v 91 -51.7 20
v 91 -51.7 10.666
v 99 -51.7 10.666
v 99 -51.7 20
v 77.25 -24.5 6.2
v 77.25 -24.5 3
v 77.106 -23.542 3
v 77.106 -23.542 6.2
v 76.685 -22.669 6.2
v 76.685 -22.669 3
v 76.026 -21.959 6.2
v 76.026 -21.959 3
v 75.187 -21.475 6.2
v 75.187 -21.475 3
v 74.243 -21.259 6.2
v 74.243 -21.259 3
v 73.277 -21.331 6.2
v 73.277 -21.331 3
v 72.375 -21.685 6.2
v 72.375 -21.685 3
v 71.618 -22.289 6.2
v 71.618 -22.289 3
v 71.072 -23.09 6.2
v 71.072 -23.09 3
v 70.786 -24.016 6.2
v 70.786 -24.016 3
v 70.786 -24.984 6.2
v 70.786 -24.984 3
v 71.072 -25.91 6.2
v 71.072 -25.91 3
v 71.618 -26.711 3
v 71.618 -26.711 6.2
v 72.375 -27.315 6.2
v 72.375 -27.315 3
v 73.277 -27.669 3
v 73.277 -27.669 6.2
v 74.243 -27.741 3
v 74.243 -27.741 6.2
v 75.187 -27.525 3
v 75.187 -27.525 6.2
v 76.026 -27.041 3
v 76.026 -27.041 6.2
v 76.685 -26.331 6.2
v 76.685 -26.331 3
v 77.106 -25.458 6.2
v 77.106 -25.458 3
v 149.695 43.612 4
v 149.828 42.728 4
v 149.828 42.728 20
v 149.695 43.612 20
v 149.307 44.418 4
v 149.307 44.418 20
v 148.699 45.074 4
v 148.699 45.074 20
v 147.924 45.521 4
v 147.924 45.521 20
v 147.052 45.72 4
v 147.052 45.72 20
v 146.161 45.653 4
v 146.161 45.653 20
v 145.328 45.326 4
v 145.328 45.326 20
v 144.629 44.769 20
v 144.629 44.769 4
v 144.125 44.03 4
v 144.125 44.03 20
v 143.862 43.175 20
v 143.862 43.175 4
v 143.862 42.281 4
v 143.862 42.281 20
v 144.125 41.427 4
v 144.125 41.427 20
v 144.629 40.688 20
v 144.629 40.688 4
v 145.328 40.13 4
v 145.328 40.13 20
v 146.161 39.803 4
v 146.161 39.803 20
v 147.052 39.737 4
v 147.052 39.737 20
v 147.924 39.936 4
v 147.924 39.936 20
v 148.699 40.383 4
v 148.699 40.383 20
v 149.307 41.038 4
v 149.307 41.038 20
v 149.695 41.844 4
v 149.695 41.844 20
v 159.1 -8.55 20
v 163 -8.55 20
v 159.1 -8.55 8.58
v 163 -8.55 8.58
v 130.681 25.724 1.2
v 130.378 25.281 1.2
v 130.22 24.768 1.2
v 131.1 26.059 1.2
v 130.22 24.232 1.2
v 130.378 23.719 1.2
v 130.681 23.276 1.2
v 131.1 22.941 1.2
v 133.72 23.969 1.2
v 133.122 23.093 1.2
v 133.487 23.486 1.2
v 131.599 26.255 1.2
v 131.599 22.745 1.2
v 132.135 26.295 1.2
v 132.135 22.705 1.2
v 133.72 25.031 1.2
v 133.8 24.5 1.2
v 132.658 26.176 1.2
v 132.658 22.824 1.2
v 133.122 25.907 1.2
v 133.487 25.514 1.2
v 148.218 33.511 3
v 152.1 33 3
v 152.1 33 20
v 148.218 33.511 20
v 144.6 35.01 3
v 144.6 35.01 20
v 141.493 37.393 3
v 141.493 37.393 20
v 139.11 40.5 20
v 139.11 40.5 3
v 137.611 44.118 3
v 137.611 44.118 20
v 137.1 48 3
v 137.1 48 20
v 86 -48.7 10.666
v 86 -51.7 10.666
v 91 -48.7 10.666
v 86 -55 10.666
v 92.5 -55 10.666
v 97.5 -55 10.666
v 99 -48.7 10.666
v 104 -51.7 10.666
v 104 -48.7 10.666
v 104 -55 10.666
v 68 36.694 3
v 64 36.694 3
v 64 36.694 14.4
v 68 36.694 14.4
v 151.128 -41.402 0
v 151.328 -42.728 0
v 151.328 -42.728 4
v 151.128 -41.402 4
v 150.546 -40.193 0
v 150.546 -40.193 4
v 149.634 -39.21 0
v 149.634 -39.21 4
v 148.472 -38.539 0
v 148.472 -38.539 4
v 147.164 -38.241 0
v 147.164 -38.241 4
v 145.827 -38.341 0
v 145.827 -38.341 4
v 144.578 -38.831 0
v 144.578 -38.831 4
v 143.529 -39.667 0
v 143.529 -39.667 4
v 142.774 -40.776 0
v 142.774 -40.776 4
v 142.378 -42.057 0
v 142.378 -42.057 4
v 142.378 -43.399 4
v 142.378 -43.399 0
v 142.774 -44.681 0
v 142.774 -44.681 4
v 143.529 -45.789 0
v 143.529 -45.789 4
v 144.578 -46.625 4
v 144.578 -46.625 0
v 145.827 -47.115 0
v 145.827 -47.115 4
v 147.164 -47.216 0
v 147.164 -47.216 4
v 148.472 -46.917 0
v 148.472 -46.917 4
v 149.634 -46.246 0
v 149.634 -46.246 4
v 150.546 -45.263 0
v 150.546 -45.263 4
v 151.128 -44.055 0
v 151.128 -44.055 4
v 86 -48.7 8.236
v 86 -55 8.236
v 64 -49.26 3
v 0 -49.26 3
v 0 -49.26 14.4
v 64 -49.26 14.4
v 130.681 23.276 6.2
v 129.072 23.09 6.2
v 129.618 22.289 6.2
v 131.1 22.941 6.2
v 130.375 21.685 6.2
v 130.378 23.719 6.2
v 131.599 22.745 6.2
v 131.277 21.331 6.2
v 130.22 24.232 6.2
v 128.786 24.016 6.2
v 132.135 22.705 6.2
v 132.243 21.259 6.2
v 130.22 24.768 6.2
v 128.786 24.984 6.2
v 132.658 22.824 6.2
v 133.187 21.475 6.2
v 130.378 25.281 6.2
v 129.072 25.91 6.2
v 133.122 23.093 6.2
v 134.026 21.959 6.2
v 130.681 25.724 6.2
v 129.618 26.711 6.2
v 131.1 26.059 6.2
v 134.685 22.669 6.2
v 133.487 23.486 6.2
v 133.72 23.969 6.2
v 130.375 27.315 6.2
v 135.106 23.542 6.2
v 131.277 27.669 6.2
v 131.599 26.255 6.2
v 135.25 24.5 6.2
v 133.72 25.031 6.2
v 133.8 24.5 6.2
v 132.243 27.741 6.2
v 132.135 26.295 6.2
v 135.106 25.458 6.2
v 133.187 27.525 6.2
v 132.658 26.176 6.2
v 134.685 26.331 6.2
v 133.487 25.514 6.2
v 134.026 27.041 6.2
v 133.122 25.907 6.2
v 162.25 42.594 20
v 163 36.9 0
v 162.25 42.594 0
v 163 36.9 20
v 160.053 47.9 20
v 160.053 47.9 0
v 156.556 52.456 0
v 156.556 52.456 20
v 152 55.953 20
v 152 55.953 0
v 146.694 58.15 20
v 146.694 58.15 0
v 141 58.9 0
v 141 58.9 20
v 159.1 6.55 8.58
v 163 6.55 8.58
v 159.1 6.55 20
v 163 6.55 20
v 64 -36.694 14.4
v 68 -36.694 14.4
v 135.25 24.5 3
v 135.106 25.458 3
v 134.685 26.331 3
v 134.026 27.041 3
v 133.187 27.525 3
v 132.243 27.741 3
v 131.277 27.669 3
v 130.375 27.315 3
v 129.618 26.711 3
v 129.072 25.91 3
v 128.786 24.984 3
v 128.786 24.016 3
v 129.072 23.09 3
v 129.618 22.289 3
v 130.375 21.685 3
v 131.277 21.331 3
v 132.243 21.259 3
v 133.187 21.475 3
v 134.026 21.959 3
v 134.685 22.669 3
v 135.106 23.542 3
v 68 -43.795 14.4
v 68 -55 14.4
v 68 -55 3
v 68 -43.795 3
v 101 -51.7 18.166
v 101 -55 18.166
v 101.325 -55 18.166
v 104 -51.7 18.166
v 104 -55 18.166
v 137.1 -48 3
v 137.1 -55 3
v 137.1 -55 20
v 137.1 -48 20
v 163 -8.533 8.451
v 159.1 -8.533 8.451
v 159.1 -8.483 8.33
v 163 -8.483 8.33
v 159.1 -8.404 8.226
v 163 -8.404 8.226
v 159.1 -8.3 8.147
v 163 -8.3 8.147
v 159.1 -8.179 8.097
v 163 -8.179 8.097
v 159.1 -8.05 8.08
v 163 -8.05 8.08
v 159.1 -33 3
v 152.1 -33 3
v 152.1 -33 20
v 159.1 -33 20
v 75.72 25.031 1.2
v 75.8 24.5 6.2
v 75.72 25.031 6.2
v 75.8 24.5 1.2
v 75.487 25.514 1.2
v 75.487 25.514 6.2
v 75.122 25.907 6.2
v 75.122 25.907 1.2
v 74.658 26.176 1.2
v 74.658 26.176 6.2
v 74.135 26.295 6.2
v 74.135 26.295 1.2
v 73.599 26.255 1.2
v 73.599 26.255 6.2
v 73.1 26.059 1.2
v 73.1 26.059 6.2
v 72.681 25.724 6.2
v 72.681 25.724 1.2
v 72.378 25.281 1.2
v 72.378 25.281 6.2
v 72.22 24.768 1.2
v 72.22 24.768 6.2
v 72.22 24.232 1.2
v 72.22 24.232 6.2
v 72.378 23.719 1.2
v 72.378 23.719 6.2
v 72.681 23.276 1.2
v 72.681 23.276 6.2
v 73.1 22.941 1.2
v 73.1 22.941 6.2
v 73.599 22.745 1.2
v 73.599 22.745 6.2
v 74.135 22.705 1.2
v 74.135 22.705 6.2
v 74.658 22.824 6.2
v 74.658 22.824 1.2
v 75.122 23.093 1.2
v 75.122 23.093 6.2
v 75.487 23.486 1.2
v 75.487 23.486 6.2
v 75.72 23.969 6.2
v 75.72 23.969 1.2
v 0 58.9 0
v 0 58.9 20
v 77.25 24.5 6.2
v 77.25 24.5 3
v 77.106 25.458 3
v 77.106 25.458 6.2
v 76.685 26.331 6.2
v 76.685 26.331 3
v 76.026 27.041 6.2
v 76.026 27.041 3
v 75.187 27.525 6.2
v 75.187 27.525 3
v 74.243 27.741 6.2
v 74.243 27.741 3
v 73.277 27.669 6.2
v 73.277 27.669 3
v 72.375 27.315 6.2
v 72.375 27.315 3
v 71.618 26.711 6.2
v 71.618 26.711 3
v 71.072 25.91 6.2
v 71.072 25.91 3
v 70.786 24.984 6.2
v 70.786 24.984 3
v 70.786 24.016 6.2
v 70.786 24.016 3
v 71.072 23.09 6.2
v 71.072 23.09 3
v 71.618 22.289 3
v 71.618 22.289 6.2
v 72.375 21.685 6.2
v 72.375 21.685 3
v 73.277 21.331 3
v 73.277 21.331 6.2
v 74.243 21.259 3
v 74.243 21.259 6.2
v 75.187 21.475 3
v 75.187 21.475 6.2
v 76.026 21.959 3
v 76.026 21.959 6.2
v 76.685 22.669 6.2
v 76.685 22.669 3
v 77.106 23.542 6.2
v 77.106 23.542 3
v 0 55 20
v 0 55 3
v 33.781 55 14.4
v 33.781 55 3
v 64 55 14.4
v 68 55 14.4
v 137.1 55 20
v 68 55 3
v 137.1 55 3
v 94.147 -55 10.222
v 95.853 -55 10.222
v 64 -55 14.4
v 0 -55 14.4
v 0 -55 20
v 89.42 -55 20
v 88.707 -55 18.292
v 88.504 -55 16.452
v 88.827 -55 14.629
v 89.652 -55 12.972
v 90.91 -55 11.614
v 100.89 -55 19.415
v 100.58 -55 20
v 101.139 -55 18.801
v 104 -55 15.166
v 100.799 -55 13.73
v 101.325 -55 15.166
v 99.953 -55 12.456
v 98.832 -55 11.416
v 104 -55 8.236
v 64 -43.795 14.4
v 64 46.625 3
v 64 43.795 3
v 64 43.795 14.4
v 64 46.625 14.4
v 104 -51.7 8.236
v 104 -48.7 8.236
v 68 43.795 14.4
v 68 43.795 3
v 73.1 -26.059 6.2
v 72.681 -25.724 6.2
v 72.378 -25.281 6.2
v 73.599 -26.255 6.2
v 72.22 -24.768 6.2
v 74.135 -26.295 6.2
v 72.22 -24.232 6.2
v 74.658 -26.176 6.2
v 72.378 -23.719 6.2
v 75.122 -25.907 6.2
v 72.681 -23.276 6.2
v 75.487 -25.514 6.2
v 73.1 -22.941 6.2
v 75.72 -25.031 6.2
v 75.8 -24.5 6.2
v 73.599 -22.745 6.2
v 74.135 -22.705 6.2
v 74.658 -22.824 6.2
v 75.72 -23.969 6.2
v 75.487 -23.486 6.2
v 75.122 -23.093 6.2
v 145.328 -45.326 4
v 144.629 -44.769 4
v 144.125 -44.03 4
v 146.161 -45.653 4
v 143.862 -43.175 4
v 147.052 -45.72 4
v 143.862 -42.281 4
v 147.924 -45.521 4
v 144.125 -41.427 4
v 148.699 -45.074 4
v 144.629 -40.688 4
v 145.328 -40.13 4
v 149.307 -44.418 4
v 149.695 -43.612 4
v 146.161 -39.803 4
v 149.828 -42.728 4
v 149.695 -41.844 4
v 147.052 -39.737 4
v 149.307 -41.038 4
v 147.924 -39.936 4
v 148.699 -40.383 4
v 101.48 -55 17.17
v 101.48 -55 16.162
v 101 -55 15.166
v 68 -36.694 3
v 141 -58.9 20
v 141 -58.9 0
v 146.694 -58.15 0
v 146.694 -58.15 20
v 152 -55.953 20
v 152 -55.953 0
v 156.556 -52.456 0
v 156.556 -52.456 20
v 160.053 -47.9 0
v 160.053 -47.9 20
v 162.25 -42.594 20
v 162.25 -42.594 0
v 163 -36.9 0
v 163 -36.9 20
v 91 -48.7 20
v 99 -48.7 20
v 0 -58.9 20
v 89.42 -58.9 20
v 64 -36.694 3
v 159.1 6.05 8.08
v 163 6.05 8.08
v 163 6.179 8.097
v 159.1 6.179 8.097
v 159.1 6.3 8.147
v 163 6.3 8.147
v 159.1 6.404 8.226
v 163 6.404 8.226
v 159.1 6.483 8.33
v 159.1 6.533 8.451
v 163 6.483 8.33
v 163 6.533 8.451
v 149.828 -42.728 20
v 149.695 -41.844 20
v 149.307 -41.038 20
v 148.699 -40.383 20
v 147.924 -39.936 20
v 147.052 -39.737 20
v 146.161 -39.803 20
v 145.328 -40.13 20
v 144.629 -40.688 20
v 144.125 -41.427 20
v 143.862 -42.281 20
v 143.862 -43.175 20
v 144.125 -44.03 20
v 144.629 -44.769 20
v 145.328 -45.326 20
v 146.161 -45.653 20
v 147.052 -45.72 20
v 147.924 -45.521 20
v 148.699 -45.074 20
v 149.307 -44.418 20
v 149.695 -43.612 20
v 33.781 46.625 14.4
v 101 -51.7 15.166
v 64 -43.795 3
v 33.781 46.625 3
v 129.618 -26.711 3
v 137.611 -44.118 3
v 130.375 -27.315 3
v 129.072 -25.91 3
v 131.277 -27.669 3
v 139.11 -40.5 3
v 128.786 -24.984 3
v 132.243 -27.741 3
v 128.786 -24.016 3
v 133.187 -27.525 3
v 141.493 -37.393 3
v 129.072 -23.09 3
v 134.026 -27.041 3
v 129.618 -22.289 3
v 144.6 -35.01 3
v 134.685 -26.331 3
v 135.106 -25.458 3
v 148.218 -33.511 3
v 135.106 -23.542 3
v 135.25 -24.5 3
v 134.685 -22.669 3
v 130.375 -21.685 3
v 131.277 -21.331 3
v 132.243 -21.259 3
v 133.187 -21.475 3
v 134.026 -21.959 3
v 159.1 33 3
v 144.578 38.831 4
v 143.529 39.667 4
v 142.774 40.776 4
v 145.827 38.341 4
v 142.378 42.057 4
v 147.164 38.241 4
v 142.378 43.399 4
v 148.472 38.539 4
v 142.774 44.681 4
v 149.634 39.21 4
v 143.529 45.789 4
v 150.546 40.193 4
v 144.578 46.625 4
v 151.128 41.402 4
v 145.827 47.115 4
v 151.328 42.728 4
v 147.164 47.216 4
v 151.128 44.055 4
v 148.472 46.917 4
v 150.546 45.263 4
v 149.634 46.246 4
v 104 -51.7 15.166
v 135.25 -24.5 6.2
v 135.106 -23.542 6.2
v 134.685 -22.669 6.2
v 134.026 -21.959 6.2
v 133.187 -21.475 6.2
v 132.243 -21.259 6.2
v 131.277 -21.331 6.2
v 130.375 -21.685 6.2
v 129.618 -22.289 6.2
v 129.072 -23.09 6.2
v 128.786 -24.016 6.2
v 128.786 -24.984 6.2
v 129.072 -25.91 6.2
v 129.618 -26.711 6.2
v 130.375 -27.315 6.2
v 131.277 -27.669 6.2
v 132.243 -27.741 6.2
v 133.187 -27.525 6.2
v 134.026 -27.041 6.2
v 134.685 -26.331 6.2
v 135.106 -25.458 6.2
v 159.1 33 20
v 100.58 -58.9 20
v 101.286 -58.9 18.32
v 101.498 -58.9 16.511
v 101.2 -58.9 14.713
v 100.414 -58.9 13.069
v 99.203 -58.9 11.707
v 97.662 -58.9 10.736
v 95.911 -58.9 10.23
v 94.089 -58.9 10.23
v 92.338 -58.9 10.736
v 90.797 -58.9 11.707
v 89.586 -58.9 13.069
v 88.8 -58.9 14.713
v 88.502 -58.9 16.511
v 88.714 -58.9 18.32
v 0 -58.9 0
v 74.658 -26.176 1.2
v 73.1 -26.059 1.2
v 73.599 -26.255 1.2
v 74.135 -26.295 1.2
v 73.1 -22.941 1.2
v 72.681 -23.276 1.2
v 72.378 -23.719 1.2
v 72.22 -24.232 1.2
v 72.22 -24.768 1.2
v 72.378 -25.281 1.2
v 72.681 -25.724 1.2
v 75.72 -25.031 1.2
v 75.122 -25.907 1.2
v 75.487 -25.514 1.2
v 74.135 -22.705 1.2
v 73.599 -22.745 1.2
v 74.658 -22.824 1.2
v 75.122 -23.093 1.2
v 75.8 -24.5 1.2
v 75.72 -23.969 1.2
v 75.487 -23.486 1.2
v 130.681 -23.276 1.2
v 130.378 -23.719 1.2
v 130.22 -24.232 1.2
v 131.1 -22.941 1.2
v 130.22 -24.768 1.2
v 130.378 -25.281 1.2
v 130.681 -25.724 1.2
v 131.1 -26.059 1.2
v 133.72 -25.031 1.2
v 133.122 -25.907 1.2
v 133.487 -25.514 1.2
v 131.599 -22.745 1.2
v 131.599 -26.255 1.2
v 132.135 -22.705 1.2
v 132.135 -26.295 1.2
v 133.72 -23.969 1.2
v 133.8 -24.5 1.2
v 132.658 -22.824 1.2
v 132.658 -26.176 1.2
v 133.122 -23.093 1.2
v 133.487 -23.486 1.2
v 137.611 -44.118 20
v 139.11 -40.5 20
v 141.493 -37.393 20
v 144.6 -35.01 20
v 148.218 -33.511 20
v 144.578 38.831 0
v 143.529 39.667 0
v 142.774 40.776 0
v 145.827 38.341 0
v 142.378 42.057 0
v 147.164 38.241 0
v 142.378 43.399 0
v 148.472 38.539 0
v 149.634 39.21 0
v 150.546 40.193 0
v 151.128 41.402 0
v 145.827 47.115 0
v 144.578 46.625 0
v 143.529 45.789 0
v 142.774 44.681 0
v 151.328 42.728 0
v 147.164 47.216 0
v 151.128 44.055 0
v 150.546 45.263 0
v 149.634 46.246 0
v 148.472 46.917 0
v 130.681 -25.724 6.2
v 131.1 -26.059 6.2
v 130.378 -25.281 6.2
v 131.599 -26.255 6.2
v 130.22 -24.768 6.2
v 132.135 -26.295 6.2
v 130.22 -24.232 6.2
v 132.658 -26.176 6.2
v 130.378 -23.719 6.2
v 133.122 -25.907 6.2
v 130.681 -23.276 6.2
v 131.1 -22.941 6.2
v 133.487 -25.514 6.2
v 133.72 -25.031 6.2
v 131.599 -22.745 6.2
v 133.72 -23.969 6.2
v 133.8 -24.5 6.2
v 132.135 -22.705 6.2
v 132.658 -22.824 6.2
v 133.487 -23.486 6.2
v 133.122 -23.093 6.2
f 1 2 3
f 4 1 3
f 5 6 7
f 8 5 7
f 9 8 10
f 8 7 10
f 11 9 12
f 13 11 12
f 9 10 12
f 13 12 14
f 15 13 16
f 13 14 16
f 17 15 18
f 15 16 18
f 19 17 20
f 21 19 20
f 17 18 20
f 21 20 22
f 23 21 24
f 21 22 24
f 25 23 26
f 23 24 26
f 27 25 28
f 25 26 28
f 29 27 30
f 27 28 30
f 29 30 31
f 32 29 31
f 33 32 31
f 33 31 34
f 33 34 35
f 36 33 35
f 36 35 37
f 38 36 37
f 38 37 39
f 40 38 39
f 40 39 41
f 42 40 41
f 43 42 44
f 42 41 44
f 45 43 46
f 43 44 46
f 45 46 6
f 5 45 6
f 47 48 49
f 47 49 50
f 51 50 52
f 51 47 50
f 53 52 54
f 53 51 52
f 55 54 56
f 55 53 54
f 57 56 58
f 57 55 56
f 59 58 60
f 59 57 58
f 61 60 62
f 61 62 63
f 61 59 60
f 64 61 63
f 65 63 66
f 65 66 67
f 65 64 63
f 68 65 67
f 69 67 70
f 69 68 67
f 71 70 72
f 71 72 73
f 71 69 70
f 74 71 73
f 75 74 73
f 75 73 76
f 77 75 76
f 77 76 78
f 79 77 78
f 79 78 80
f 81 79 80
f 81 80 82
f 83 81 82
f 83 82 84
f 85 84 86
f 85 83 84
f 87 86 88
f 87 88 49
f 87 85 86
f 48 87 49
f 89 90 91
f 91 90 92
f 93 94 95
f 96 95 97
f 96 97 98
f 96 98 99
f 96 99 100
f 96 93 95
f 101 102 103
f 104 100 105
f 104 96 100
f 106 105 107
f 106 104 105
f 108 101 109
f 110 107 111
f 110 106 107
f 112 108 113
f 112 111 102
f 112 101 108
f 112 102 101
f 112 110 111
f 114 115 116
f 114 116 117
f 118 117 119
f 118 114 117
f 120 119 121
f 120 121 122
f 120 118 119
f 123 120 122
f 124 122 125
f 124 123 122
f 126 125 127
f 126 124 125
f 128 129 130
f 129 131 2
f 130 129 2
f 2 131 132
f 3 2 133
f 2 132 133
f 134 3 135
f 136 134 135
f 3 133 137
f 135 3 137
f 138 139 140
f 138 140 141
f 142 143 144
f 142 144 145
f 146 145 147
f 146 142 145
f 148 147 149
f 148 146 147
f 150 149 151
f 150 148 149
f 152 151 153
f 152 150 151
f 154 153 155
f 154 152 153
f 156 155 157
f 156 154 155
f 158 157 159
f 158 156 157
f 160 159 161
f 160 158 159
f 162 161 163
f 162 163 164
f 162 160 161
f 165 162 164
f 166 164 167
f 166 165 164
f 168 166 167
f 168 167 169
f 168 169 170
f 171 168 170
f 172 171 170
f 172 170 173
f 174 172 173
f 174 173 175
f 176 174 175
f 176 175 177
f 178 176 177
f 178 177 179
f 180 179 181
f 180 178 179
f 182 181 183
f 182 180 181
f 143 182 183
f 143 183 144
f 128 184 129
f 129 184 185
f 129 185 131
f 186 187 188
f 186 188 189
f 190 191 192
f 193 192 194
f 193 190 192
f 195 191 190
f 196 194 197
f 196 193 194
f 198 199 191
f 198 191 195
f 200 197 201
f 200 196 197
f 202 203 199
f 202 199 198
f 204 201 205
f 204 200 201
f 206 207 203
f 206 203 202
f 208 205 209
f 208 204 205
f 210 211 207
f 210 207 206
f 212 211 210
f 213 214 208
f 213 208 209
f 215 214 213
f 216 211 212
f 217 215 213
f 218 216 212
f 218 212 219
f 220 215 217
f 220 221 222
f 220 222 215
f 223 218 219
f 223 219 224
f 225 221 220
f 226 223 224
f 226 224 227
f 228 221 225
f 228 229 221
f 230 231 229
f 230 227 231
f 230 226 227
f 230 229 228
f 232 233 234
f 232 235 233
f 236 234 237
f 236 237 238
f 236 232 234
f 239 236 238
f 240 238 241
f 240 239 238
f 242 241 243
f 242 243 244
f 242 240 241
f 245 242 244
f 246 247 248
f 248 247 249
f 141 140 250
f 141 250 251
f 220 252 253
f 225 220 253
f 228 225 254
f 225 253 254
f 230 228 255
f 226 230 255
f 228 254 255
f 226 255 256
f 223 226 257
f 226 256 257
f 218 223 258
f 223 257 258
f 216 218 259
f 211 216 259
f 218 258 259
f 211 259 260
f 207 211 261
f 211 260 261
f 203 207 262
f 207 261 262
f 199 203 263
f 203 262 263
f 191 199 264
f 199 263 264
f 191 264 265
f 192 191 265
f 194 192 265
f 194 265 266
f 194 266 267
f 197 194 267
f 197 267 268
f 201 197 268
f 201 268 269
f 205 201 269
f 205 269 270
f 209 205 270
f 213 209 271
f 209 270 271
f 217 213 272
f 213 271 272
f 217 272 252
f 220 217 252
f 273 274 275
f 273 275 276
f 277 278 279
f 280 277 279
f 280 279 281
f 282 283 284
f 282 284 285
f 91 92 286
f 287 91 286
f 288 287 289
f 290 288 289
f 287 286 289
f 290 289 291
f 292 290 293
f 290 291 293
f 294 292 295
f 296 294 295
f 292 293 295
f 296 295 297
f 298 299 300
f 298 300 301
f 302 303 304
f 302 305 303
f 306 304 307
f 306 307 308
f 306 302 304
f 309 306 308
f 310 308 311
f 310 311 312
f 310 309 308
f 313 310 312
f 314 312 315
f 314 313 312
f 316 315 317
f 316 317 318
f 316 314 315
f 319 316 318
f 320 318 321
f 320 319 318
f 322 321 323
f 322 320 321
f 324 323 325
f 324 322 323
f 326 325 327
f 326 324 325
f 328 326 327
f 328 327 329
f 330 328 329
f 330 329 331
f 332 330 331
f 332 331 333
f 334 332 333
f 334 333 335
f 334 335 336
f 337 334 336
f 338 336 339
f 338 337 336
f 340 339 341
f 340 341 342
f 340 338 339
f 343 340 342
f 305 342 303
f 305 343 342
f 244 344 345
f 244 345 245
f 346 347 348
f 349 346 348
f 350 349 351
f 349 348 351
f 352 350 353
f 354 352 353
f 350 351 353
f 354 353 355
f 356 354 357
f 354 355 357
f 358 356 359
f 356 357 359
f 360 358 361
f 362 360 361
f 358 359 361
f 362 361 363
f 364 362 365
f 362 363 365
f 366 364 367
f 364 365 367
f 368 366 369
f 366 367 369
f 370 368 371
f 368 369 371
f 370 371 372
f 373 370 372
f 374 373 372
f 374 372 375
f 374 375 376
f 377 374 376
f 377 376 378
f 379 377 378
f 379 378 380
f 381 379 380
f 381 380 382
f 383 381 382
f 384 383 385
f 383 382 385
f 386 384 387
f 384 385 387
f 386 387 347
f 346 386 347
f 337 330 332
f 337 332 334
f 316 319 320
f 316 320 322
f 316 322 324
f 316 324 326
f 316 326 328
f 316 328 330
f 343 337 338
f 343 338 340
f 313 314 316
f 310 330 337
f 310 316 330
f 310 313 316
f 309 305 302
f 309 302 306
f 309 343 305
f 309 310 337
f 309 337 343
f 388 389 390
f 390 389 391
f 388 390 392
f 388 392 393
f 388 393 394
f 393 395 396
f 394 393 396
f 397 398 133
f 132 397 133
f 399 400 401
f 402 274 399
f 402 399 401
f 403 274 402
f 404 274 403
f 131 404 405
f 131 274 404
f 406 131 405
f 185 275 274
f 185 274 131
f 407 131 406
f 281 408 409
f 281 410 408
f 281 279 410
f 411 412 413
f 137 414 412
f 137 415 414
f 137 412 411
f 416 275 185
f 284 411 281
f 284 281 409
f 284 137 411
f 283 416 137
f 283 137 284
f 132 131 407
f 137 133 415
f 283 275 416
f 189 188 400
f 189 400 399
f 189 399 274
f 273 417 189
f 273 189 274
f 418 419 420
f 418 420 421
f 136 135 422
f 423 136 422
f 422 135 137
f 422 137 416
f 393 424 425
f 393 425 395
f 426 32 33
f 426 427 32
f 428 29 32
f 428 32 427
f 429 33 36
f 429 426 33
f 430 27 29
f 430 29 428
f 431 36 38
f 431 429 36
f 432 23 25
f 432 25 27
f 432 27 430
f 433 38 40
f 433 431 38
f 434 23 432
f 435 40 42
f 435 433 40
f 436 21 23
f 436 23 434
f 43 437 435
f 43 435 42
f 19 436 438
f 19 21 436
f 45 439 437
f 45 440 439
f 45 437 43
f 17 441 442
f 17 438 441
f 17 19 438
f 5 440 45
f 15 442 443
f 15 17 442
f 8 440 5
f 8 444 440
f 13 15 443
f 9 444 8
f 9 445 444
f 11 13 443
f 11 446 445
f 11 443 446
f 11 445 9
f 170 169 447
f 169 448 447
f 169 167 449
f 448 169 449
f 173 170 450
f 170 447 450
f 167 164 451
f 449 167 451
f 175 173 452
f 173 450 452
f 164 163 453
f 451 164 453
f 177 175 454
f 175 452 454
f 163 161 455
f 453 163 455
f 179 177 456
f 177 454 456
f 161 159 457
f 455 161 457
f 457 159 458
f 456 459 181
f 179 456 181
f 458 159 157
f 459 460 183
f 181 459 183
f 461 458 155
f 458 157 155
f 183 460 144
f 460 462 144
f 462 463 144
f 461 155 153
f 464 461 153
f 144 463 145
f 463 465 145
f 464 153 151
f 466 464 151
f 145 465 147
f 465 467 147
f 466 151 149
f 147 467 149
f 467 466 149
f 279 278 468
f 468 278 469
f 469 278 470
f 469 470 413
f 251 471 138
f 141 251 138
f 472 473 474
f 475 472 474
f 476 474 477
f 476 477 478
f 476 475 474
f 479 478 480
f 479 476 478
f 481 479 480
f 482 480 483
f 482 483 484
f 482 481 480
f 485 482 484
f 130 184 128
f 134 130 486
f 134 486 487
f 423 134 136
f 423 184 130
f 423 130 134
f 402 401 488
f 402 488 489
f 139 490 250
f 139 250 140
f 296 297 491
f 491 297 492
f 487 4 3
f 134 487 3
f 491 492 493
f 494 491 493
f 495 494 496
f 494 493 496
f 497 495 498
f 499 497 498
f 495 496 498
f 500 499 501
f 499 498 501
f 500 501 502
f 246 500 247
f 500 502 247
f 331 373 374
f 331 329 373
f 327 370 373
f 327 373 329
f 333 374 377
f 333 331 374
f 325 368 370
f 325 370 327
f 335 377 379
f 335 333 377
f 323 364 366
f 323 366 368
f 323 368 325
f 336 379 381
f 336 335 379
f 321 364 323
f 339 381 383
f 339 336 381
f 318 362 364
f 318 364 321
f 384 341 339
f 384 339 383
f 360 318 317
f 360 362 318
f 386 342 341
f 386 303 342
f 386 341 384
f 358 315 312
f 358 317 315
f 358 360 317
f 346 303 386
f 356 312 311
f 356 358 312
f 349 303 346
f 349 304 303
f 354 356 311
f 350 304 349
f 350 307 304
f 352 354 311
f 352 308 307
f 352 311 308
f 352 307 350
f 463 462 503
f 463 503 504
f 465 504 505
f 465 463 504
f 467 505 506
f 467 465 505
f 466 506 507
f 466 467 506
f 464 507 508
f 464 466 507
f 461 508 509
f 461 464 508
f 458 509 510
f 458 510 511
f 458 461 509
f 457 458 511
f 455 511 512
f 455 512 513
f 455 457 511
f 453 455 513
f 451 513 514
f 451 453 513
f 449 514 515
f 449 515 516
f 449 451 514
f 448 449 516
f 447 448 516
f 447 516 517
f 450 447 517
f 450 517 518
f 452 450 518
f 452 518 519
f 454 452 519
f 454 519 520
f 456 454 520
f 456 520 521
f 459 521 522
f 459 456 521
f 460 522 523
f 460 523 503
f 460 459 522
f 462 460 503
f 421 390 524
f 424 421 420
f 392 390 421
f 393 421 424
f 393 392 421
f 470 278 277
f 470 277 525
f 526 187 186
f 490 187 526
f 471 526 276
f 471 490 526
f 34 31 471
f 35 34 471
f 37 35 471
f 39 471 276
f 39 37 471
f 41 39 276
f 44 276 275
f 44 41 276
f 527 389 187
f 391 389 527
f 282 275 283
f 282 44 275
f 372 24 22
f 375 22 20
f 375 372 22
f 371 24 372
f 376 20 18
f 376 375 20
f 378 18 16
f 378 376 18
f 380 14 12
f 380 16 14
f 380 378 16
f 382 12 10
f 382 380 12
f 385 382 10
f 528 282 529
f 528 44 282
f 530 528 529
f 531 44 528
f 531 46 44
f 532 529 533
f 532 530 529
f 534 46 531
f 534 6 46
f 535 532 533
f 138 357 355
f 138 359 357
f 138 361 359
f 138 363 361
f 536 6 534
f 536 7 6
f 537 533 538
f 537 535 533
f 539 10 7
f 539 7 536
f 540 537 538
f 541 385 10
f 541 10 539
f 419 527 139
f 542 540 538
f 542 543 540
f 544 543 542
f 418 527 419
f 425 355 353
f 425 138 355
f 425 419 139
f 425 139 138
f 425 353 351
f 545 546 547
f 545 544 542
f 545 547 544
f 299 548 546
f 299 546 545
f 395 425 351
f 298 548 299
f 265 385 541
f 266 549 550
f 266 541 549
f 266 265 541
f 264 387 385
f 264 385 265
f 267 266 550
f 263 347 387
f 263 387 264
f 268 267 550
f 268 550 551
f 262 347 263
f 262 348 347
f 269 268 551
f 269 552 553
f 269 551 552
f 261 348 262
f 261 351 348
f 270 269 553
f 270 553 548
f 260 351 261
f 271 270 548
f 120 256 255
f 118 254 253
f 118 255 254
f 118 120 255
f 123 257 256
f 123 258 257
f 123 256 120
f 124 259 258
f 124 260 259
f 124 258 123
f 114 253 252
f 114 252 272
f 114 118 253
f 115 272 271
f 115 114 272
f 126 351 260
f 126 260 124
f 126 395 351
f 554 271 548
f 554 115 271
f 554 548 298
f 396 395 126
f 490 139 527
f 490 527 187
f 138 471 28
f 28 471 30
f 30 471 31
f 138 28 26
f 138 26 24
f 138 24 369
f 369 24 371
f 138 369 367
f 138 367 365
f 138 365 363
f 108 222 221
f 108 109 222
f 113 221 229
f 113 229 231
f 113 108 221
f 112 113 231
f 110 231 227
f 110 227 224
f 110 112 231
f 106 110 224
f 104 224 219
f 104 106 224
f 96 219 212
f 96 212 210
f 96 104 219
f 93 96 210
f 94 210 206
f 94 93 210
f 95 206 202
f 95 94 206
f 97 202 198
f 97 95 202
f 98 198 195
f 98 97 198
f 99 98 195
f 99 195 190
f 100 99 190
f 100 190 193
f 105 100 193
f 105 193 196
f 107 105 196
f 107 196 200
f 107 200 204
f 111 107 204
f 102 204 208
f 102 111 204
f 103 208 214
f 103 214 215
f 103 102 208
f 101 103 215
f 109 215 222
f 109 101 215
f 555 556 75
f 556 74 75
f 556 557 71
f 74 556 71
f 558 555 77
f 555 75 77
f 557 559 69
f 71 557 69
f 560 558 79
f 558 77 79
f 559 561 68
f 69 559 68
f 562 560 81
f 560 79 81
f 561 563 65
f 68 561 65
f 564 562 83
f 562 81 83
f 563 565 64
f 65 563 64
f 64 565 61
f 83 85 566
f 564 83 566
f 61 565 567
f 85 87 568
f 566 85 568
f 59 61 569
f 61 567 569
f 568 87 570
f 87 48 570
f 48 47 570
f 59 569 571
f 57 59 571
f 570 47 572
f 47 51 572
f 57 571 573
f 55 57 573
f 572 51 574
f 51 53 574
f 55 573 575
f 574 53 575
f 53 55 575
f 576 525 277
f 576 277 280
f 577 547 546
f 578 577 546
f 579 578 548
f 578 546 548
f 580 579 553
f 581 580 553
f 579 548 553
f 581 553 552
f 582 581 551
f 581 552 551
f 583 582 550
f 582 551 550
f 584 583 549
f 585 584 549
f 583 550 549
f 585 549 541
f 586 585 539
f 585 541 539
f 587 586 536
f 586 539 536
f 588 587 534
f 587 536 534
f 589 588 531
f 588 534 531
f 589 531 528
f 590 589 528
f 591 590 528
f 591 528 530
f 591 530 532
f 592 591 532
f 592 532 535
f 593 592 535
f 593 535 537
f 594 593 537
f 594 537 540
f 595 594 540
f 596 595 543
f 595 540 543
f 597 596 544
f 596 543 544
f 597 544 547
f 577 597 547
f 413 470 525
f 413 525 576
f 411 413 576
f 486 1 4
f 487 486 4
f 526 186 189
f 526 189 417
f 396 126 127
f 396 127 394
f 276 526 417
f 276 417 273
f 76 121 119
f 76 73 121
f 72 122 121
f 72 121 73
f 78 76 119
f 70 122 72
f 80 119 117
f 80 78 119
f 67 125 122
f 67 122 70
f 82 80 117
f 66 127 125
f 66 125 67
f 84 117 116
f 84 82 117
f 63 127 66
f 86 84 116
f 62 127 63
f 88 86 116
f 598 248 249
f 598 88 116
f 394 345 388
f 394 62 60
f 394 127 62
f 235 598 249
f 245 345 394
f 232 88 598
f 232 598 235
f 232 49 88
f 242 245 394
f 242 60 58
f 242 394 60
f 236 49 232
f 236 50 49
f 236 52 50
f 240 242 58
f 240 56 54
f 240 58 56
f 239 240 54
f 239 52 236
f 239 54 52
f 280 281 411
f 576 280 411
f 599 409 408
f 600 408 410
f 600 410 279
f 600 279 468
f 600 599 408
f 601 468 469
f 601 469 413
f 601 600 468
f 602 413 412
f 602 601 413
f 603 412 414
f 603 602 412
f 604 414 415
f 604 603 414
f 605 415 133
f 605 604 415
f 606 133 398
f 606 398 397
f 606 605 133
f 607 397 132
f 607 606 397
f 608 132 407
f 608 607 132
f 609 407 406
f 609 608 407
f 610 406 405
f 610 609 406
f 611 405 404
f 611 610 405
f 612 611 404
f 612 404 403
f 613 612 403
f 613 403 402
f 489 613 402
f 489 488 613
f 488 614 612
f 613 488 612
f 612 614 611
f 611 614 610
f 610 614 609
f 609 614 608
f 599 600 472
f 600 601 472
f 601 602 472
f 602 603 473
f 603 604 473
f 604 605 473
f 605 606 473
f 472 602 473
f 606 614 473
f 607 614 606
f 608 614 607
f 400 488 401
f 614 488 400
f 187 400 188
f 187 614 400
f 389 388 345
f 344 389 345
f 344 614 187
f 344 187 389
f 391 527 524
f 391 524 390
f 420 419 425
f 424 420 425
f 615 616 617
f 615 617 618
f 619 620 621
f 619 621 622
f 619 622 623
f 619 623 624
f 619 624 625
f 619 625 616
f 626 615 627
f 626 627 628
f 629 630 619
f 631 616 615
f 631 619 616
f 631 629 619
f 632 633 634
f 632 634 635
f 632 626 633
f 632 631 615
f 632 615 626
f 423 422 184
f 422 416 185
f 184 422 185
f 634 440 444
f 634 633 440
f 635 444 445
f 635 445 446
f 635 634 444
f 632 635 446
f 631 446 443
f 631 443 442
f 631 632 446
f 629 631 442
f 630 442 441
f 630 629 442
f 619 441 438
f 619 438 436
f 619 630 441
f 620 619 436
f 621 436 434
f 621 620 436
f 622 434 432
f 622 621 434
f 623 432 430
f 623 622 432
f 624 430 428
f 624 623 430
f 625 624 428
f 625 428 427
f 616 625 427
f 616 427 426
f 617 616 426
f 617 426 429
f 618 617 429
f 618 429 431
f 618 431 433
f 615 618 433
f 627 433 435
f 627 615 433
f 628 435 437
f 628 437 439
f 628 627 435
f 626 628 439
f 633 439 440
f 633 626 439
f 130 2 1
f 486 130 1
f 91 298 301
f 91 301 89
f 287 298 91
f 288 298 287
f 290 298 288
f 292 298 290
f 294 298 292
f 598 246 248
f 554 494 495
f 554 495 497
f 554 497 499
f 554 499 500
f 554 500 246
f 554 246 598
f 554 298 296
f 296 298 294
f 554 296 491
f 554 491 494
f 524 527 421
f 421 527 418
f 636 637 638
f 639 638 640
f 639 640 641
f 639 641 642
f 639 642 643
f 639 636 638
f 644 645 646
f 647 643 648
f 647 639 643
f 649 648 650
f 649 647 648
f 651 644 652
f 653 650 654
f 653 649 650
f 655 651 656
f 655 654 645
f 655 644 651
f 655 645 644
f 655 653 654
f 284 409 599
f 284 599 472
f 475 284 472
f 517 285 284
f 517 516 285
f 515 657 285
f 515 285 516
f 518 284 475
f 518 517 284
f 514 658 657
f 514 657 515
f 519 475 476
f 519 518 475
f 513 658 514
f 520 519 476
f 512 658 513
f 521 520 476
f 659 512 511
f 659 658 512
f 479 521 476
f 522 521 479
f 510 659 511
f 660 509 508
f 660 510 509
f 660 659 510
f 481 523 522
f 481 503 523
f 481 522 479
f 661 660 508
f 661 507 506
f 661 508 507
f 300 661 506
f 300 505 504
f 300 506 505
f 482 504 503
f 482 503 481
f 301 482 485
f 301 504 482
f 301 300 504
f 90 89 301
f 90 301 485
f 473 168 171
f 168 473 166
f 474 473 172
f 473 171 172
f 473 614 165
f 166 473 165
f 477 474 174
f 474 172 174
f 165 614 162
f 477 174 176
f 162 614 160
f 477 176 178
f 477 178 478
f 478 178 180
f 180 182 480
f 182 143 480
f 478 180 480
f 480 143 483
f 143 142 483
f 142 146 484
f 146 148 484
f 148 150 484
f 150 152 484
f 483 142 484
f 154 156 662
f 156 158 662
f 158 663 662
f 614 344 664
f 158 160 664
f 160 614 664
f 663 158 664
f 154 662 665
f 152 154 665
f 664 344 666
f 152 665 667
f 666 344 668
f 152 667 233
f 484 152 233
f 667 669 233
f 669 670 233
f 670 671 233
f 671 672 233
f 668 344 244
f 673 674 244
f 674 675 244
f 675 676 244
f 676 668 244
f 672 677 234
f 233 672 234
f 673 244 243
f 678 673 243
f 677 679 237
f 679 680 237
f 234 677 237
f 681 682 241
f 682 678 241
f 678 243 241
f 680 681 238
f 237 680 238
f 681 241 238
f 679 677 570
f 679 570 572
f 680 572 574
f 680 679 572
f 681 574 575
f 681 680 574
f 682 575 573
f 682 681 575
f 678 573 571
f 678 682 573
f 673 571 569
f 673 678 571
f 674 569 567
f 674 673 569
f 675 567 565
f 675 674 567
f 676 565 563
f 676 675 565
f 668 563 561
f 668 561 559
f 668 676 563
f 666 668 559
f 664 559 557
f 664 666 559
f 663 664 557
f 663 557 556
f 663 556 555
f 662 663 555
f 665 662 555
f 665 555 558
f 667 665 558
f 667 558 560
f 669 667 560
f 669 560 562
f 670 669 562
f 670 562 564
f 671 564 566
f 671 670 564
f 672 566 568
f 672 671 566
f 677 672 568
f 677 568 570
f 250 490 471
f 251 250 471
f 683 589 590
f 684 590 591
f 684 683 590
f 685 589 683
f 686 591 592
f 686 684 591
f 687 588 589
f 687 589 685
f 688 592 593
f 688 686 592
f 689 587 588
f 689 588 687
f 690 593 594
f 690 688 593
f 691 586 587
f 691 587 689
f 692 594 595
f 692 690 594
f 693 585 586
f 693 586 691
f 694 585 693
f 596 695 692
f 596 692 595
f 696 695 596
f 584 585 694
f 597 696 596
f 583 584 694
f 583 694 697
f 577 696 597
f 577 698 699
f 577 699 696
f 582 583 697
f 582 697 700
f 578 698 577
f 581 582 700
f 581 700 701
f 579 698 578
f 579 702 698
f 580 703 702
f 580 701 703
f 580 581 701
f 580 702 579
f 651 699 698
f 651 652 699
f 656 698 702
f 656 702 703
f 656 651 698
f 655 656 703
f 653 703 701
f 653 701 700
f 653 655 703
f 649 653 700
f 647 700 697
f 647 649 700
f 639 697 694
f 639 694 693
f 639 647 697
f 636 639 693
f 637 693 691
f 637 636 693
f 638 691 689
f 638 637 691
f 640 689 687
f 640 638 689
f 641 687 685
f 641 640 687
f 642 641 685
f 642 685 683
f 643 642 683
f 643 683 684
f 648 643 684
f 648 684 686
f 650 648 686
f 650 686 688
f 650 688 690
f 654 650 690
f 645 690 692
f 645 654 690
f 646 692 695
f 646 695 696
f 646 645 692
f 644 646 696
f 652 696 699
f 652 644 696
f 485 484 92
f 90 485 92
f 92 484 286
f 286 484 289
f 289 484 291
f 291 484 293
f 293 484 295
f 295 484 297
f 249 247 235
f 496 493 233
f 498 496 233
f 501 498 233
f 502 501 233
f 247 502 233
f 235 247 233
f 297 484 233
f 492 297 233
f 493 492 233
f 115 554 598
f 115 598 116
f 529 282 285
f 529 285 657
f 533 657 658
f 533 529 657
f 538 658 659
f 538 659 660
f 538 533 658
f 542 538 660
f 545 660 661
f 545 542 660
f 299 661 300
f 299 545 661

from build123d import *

# Parameters (mm, degrees)
SKETCH1_W               = 326
SKETCH1_H               = 117.8
SKETCH1_W_2             = 318.2
SKETCH1_H_2             = 110
BOSS_EXTRUDE1_DEPTH     = 20
SKETCH1_3_W             = 318.2
SKETCH1_3_H             = 110
BOSS_EXTRUDE2_DEPTH     = 3
BOSS_EXTRUDE6_START     = 3
SKETCH6_R               = 3.25
SKETCH6_R_2             = 1.8
BOSS_EXTRUDE6_DEPTH     = 3.2
FILLET1_R               = 22
CUT_EXTRUDE3_START      = 163
CUT_EXTRUDE3_DEPTH      = 3.9
CUT_EXTRUDE4_START      = 1.2
SKETCH6_2_R             = 1.8
CUT_EXTRUDE4_DEPTH      = 1.8
SKETCH5_W               = 64.404478897
SKETCH5_H               = 11.204693833
SKETCH5_W_2             = 4
SKETCH5_H_2             = 98.795306167
SKETCH5_W_3             = 30.218685567
SKETCH5_H_3             = 8.375486052
SKETCH5_H_4             = 73.388395798
SKETCH5_W_4             = 147.589311785
SKETCH5_H_5             = 5.740206696
BOSS_EXTRUDE7_DEPTH     = 14.4
CUT_EXTRUDE5_START      = -58.9
SKETCH10_R              = 6.5
CUT_EXTRUDE5_DEPTH      = 3.9
BOSS_EXTRUDE8_START     = -55
SKETCH11_W              = 18
SKETCH11_H              = 2.429995135
SKETCH11_W_2            = 3
SKETCH11_H_2            = 3
BOSS_EXTRUDE8_DEPTH     = 3.3
BOSS_EXTRUDE9_START     = -51.7
BOSS_EXTRUDE9_DEPTH     = 3
BOSS_EXTRUDE10_START    = 3
SKETCH12_R              = 3
BOSS_EXTRUDE10_DEPTH    = 17
SKETCH12_3_R            = 3
CUT_EXTRUDE6_DEPTH      = 6
SKETCH13_R              = 4.5
CUT_EXTRUDE7_DEPTH      = 4
CUT_EXTRUDE8_DEPTH      = 30
CUT_EXTRUDE8_DEPTH_BACK = 40
SKETCH14_W              = 179.941396495
SKETCH14_H              = 132.266113534


with BuildPart() as part:
    # Sketch1 → Boss-Extrude1 (new body)
    with BuildSketch(Plane.XY):
        Rectangle(SKETCH1_W, SKETCH1_H)
        Rectangle(SKETCH1_W_2, SKETCH1_H_2, mode=Mode.SUBTRACT)
    extrude(amount=BOSS_EXTRUDE1_DEPTH)

    # Sketch1<3> → Boss-Extrude2 (add)
    with BuildSketch(Plane.XY):
        Rectangle(SKETCH1_3_W, SKETCH1_3_H)
    extrude(amount=BOSS_EXTRUDE2_DEPTH)

    # Sketch6 → Boss-Extrude6 (add)
    # profile 1 of 4: a face of its own
    with BuildSketch(Plane.XY.offset(BOSS_EXTRUDE6_START)):
        with Locations((132, -24.5)):
            Circle(SKETCH6_R)
        with Locations((132, -24.5)):
            Circle(SKETCH6_R_2, mode=Mode.SUBTRACT)
    # profile 2 of 4: a face of its own
    with BuildSketch(Plane.XY.offset(BOSS_EXTRUDE6_START)):
        with Locations((74, -24.5)):
            Circle(SKETCH6_R)
        with Locations((74, -24.5)):
            Circle(SKETCH6_R_2, mode=Mode.SUBTRACT)
    # profile 3 of 4: a face of its own
    with BuildSketch(Plane.XY.offset(BOSS_EXTRUDE6_START)):
        with Locations((74, 24.5)):
            Circle(SKETCH6_R)
        with Locations((74, 24.5)):
            Circle(SKETCH6_R_2, mode=Mode.SUBTRACT)
    # profile 4 of 4: a face of its own
    with BuildSketch(Plane.XY.offset(BOSS_EXTRUDE6_START)):
        with Locations((132, 24.5)):
            Circle(SKETCH6_R)
        with Locations((132, 24.5)):
            Circle(SKETCH6_R_2, mode=Mode.SUBTRACT)
    extrude(amount=BOSS_EXTRUDE6_DEPTH)

    # Fillet1
    fillet1_edges = [part.edges().sort_by_distance(p)[0] for p in [
        (163, 58.9, 10),
        (163, -58.9, 10),
        (-163, -58.9, 10),
        (-163, 58.9, 10),
        (159.1, 55, 11.5),
        (-159.1, 55, 11.5),
        (-159.1, -55, 11.5),
        (159.1, -55, 11.5),
    ]]
    fillet(fillet1_edges, radius=FILLET1_R)

    # Sketch9 → Cut-Extrude3 (cut)
    with BuildSketch(Plane(origin=(0, 0, 0), x_dir=(0, 0, -1), z_dir=(1, 0, 0)).offset(CUT_EXTRUDE3_START)):
        with BuildLine():
            Line((-20, -8.55), (-8.58, -8.55))
            ThreePointArc((-8.58, -8.55), (-8.226446609, -8.403553391), (-8.08, -8.05))
            Line((-8.08, -8.05), (-8.08, 6.05))
            ThreePointArc((-8.08, 6.05), (-8.226446609, 6.403553391), (-8.58, 6.55))
            Line((-8.58, 6.55), (-20, 6.55))
            Line((-20, 6.55), (-20, -8.55))
        make_face()
    extrude(amount=-CUT_EXTRUDE3_DEPTH, mode=Mode.SUBTRACT)

    # Sketch6<2> → Cut-Extrude4 (cut)
    with BuildSketch(Plane.XY.offset(CUT_EXTRUDE4_START)):
        with Locations((132, -24.5)):
            Circle(SKETCH6_2_R)
        with Locations((132, 24.5)):
            Circle(SKETCH6_2_R)
        with Locations((74, 24.5)):
            Circle(SKETCH6_2_R)
        with Locations((74, -24.5)):
            Circle(SKETCH6_2_R)
    extrude(amount=CUT_EXTRUDE4_DEPTH, mode=Mode.SUBTRACT)

    # Sketch5 → Boss-Extrude7 (add)
    with BuildSketch(Plane.XY):
        with Locations((-66.797760552, 49.397653084)):
            Rectangle(SKETCH5_W, SKETCH5_H)
        with Locations((-101, 5.602346917)):
            Rectangle(SKETCH5_W_2, SKETCH5_H_2)
        with Locations((48.890657217, 50.812256974)):
            Rectangle(SKETCH5_W_3, SKETCH5_H_3)
        with Locations((66, 49.397653084)):
            Rectangle(SKETCH5_W_2, SKETCH5_H)
        with Locations((66, 0)):
            Rectangle(SKETCH5_W_2, SKETCH5_H_4)
        with Locations((-9.794655893, -52.129896652)):
            Rectangle(SKETCH5_W_4, SKETCH5_H_5)
        with Locations((66, -49.397653084)):
            Rectangle(SKETCH5_W_2, SKETCH5_H)
    extrude(amount=BOSS_EXTRUDE7_DEPTH)

    # Sketch10 → Cut-Extrude5 (cut)
    with BuildSketch(Plane(origin=(0, 0, 0), x_dir=(1, 0, 0), z_dir=(0, 1, 0)).offset(CUT_EXTRUDE5_START)):
        with Locations((95, -16.665643961)):
            Circle(SKETCH10_R)
        with Locations((-95, -16.665643961)):
            Circle(SKETCH10_R)
    extrude(amount=CUT_EXTRUDE5_DEPTH, mode=Mode.SUBTRACT)

    # Sketch11 → Boss-Extrude8 (add)
    with BuildSketch(Plane(origin=(0, 0, 0), x_dir=(1, 0, 0), z_dir=(0, 1, 0)).offset(BOSS_EXTRUDE8_START)):
        Polygon((-104.033941149, -14.931036323), (-101.03394878, -14.937802738), (-101.040715195, -17.937795107), (-104.040707565, -17.931028692), align=None)
        Polygon((-86.018356525, -8.041657306), (-104.018310741, -8.001058815), (-104.023791526, -10.431047769), (-86.023837311, -10.47164626), align=None)
        with Locations((95, -9.450646394)):
            Rectangle(SKETCH11_W, SKETCH11_H)
        with Locations((102.5, -16.665643961)):
            Rectangle(SKETCH11_W_2, SKETCH11_H_2)
    extrude(amount=BOSS_EXTRUDE8_DEPTH)

    # Sketch11<3> → Boss-Extrude9 (add)
    with BuildSketch(Plane(origin=(0, 0, 0), x_dir=(1, 0, 0), z_dir=(0, 1, 0)).offset(BOSS_EXTRUDE9_START)):
        Polygon((86, -8.235648826), (86, -10.665643961), (91, -10.665643961), (91, -20), (99, -20), (99, -10.665643961), (104, -10.665643961), (104, -8.235648826), align=None)
        Polygon((-104.023791526, -10.431047769), (-99.023804244, -10.442325128), (-99.044857621, -19.776657424), (-91.044877969, -19.794701198), (-91.023824593, -10.460368902), (-86.023837311, -10.47164626), (-86.018356525, -8.041657306), (-104.018310741, -8.001058815), align=None)
    extrude(amount=BOSS_EXTRUDE9_DEPTH)

    # Sketch12 → Boss-Extrude10 (add)
    # profile 1 of 4: a face of its own
    with BuildSketch(Plane.XY.offset(BOSS_EXTRUDE10_START)):
        with BuildLine():
            Line((-137.1, -55), (-137.1, -48))
            ThreePointArc((-137.1, -48), (-141.493398282, -37.393398282), (-152.1, -33))
            Line((-152.1, -33), (-159.1, -33))
            ThreePointArc((-159.1, -33), (-152.656349186, -48.556349186), (-137.1, -55))
        make_face()
        with Locations((-146.828174593, -42.728174593)):
            Circle(SKETCH12_R, mode=Mode.SUBTRACT)
    # profile 2 of 4: a face of its own
    with BuildSketch(Plane.XY.offset(BOSS_EXTRUDE10_START)):
        with BuildLine():
            ThreePointArc((-137.1, 48), (-141.493398282, 37.393398282), (-152.1, 33))
            Line((-152.1, 33), (-159.1, 33))
            ThreePointArc((-159.1, 33), (-152.656349186, 48.556349186), (-137.1, 55))
            Line((-137.1, 55), (-137.1, 48))
        make_face()
        with Locations((-146.828174593, 42.728174593)):
            Circle(SKETCH12_R, mode=Mode.SUBTRACT)
    # profile 3 of 4: a face of its own
    with BuildSketch(Plane.XY.offset(BOSS_EXTRUDE10_START)):
        with BuildLine():
            ThreePointArc((152.1, 33), (141.493398282, 37.393398282), (137.1, 48))
            Line((137.1, 48), (137.1, 55))
            ThreePointArc((137.1, 55), (152.656349186, 48.556349186), (159.1, 33))
            Line((159.1, 33), (152.1, 33))
        make_face()
        with Locations((146.828174593, 42.728174593)):
            Circle(SKETCH12_R, mode=Mode.SUBTRACT)
    # profile 4 of 4: a face of its own
    with BuildSketch(Plane.XY.offset(BOSS_EXTRUDE10_START)):
        with BuildLine():
            ThreePointArc((137.1, -48), (141.493398282, -37.393398282), (152.1, -33))
            Line((152.1, -33), (159.1, -33))
            ThreePointArc((159.1, -33), (152.656349186, -48.556349186), (137.1, -55))
            Line((137.1, -55), (137.1, -48))
        make_face()
        with Locations((146.828174593, -42.728174593)):
            Circle(SKETCH12_R, mode=Mode.SUBTRACT)
    extrude(amount=BOSS_EXTRUDE10_DEPTH)

    # Sketch12<3> → Cut-Extrude6 (cut)
    with BuildSketch(Plane.XY):
        with Locations((146.828174593, 42.728174593)):
            Circle(SKETCH12_3_R)
        with Locations((146.828174593, -42.728174593)):
            Circle(SKETCH12_3_R)
        with Locations((-146.828174593, -42.728174593)):
            Circle(SKETCH12_3_R)
        with Locations((-146.828174593, 42.728174593)):
            Circle(SKETCH12_3_R)
    extrude(amount=CUT_EXTRUDE6_DEPTH, mode=Mode.SUBTRACT)

    # Sketch13 → Cut-Extrude7 (cut)
    with BuildSketch(Plane.XY):
        with Locations((-146.828174593, -42.728174593)):
            Circle(SKETCH13_R)
        with Locations((-146.828174593, 42.728174593)):
            Circle(SKETCH13_R)
        with Locations((146.828174593, 42.728174593)):
            Circle(SKETCH13_R)
        with Locations((146.828174593, -42.728174593)):
            Circle(SKETCH13_R)
    extrude(amount=CUT_EXTRUDE7_DEPTH, mode=Mode.SUBTRACT)

    # Sketch14 → Cut-Extrude8 (cut, two sides: drawn at the far end of the back side and taken through both)
    with BuildSketch(Plane.XY.offset(-CUT_EXTRUDE8_DEPTH_BACK)):
        with Locations((-89.970698248, -3.418642863)):
            Rectangle(SKETCH14_W, SKETCH14_H)
    extrude(amount=CUT_EXTRUDE8_DEPTH + CUT_EXTRUDE8_DEPTH_BACK, mode=Mode.SUBTRACT)


solid = part.part
